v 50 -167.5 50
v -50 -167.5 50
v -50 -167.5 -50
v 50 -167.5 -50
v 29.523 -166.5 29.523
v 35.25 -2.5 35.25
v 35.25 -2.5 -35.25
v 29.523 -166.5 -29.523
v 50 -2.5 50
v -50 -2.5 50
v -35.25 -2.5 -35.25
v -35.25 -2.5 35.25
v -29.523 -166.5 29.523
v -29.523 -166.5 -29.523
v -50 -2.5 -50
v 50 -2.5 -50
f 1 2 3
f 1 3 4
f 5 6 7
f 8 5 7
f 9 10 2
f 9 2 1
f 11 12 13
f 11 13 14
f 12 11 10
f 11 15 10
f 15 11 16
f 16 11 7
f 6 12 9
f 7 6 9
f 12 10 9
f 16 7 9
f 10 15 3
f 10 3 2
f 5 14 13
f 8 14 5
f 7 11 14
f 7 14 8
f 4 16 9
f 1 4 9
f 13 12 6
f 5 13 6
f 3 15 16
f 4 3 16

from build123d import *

# Parameters (mm, degrees)
SKETCH2_W           = 100
SKETCH2_H           = 100
BOSS_EXTRUDE1_DEPTH = 165
SKETCH3_W           = 70.5
SKETCH3_H           = 70.499969084
CUT_EXTRUDE1_DEPTH  = 164
CUT_EXTRUDE1_DRAFT  = -2


with BuildPart() as part:
    # Sketch2 → Boss-Extrude1 (new body)
    with BuildSketch(Plane.XZ.offset(2.5)):
        Rectangle(SKETCH2_W, SKETCH2_H)
    extrude(amount=BOSS_EXTRUDE1_DEPTH)


with BuildPart() as cut_extrude1_tool:
    # Sketch3 → Cut-Extrude1 (with draft: the straight prism first)
    with BuildSketch(Plane(origin=(0, -2.5, 0), x_dir=(1, 0, 0), z_dir=(0, 1, 0))):
        Rectangle(SKETCH3_W, SKETCH3_H)
    extrude(amount=-CUT_EXTRUDE1_DEPTH)
    # Cut-Extrude1: the draft: its side faces are tilted about the plane it starts from
    cut_extrude1_sides = [cut_extrude1_tool.faces().sort_by_distance(p)[0] for p in [
        (0, -84.5, 35.249984542),
        (35.25, -84.5, 0),
        (0, -84.5, -35.249984542),
        (-35.25, -84.5, 0),
    ]]
    draft(cut_extrude1_sides, Plane(origin=(0, -2.5, 0), x_dir=(1, 0, 0), z_dir=(0, 1, 0)), CUT_EXTRUDE1_DRAFT)


with BuildPart() as part_1:
    add(part.part)

    # Cut-Extrude1: cut by cut_extrude1_tool
    add(cut_extrude1_tool.part, mode=Mode.SUBTRACT)


solid = part_1.part
